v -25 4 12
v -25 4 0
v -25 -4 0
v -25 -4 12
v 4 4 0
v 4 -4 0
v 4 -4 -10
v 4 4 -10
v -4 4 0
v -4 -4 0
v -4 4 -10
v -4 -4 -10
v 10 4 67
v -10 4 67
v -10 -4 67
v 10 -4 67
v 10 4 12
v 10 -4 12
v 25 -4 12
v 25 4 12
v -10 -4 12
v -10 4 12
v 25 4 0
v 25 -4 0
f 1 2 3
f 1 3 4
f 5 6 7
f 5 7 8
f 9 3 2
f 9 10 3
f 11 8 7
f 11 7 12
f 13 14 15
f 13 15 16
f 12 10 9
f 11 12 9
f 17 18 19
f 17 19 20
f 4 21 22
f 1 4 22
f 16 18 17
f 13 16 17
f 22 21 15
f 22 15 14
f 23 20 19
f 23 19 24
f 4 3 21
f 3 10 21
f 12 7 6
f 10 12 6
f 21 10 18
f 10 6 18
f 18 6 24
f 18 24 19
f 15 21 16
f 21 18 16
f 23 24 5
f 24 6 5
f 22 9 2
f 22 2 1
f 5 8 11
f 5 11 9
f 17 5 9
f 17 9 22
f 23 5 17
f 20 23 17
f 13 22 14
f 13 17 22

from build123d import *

# Parameters (mm, degrees)
SKETCH_1_W      = 20
SKETCH_1_H      = 8
EXTRUDE_1_DEPTH = 12
SKETCH_5_W      = 8
SKETCH_5_H      = 8
EXTRUDE_5_DEPTH = 10
SKETCH_8_W      = 20
SKETCH_8_H      = 8
EXTRUDE_6_DEPTH = 55
SKETCH_9_W      = 12
SKETCH_9_H      = 8
EXTRUDE_7_DEPTH = 15
SKETCH_10_W     = 12
SKETCH_10_H     = 8
EXTRUDE_8_DEPTH = 15


with BuildPart() as part:
    # ｽｹｯﾁ1 → ﾎﾞｽ - 押し出し1 (new body)
    with BuildSketch(Plane.XY):
        Rectangle(SKETCH_1_W, SKETCH_1_H)
    extrude(amount=EXTRUDE_1_DEPTH)

    # ｽｹｯﾁ5 → ﾎﾞｽ - 押し出し5 (add)
    with BuildSketch(Plane(origin=(0, 0, 0), x_dir=(-1, 0, 0), z_dir=(0, 0, -1))):
        Rectangle(SKETCH_5_W, SKETCH_5_H)
    extrude(amount=EXTRUDE_5_DEPTH)

    # ｽｹｯﾁ8 → ﾎﾞｽ - 押し出し6 (add)
    with BuildSketch(Plane.XY.offset(12)):
        Rectangle(SKETCH_8_W, SKETCH_8_H)
    extrude(amount=EXTRUDE_6_DEPTH)

    # ｽｹｯﾁ9 → ﾎﾞｽ - 押し出し7 (add)
    with BuildSketch(Plane(origin=(10, 0, 0), x_dir=(0, 0, -1), z_dir=(1, 0, 0))):
        with Locations((-6, 0)):
            Rectangle(SKETCH_9_W, SKETCH_9_H)
    extrude(amount=EXTRUDE_7_DEPTH)

    # ｽｹｯﾁ10 → ﾎﾞｽ - 押し出し8 (add)
    with BuildSketch(Plane.ZY.offset(10)):
        with Locations((6, 0)):
            Rectangle(SKETCH_10_W, SKETCH_10_H)
    extrude(amount=EXTRUDE_8_DEPTH)


solid = part.part
